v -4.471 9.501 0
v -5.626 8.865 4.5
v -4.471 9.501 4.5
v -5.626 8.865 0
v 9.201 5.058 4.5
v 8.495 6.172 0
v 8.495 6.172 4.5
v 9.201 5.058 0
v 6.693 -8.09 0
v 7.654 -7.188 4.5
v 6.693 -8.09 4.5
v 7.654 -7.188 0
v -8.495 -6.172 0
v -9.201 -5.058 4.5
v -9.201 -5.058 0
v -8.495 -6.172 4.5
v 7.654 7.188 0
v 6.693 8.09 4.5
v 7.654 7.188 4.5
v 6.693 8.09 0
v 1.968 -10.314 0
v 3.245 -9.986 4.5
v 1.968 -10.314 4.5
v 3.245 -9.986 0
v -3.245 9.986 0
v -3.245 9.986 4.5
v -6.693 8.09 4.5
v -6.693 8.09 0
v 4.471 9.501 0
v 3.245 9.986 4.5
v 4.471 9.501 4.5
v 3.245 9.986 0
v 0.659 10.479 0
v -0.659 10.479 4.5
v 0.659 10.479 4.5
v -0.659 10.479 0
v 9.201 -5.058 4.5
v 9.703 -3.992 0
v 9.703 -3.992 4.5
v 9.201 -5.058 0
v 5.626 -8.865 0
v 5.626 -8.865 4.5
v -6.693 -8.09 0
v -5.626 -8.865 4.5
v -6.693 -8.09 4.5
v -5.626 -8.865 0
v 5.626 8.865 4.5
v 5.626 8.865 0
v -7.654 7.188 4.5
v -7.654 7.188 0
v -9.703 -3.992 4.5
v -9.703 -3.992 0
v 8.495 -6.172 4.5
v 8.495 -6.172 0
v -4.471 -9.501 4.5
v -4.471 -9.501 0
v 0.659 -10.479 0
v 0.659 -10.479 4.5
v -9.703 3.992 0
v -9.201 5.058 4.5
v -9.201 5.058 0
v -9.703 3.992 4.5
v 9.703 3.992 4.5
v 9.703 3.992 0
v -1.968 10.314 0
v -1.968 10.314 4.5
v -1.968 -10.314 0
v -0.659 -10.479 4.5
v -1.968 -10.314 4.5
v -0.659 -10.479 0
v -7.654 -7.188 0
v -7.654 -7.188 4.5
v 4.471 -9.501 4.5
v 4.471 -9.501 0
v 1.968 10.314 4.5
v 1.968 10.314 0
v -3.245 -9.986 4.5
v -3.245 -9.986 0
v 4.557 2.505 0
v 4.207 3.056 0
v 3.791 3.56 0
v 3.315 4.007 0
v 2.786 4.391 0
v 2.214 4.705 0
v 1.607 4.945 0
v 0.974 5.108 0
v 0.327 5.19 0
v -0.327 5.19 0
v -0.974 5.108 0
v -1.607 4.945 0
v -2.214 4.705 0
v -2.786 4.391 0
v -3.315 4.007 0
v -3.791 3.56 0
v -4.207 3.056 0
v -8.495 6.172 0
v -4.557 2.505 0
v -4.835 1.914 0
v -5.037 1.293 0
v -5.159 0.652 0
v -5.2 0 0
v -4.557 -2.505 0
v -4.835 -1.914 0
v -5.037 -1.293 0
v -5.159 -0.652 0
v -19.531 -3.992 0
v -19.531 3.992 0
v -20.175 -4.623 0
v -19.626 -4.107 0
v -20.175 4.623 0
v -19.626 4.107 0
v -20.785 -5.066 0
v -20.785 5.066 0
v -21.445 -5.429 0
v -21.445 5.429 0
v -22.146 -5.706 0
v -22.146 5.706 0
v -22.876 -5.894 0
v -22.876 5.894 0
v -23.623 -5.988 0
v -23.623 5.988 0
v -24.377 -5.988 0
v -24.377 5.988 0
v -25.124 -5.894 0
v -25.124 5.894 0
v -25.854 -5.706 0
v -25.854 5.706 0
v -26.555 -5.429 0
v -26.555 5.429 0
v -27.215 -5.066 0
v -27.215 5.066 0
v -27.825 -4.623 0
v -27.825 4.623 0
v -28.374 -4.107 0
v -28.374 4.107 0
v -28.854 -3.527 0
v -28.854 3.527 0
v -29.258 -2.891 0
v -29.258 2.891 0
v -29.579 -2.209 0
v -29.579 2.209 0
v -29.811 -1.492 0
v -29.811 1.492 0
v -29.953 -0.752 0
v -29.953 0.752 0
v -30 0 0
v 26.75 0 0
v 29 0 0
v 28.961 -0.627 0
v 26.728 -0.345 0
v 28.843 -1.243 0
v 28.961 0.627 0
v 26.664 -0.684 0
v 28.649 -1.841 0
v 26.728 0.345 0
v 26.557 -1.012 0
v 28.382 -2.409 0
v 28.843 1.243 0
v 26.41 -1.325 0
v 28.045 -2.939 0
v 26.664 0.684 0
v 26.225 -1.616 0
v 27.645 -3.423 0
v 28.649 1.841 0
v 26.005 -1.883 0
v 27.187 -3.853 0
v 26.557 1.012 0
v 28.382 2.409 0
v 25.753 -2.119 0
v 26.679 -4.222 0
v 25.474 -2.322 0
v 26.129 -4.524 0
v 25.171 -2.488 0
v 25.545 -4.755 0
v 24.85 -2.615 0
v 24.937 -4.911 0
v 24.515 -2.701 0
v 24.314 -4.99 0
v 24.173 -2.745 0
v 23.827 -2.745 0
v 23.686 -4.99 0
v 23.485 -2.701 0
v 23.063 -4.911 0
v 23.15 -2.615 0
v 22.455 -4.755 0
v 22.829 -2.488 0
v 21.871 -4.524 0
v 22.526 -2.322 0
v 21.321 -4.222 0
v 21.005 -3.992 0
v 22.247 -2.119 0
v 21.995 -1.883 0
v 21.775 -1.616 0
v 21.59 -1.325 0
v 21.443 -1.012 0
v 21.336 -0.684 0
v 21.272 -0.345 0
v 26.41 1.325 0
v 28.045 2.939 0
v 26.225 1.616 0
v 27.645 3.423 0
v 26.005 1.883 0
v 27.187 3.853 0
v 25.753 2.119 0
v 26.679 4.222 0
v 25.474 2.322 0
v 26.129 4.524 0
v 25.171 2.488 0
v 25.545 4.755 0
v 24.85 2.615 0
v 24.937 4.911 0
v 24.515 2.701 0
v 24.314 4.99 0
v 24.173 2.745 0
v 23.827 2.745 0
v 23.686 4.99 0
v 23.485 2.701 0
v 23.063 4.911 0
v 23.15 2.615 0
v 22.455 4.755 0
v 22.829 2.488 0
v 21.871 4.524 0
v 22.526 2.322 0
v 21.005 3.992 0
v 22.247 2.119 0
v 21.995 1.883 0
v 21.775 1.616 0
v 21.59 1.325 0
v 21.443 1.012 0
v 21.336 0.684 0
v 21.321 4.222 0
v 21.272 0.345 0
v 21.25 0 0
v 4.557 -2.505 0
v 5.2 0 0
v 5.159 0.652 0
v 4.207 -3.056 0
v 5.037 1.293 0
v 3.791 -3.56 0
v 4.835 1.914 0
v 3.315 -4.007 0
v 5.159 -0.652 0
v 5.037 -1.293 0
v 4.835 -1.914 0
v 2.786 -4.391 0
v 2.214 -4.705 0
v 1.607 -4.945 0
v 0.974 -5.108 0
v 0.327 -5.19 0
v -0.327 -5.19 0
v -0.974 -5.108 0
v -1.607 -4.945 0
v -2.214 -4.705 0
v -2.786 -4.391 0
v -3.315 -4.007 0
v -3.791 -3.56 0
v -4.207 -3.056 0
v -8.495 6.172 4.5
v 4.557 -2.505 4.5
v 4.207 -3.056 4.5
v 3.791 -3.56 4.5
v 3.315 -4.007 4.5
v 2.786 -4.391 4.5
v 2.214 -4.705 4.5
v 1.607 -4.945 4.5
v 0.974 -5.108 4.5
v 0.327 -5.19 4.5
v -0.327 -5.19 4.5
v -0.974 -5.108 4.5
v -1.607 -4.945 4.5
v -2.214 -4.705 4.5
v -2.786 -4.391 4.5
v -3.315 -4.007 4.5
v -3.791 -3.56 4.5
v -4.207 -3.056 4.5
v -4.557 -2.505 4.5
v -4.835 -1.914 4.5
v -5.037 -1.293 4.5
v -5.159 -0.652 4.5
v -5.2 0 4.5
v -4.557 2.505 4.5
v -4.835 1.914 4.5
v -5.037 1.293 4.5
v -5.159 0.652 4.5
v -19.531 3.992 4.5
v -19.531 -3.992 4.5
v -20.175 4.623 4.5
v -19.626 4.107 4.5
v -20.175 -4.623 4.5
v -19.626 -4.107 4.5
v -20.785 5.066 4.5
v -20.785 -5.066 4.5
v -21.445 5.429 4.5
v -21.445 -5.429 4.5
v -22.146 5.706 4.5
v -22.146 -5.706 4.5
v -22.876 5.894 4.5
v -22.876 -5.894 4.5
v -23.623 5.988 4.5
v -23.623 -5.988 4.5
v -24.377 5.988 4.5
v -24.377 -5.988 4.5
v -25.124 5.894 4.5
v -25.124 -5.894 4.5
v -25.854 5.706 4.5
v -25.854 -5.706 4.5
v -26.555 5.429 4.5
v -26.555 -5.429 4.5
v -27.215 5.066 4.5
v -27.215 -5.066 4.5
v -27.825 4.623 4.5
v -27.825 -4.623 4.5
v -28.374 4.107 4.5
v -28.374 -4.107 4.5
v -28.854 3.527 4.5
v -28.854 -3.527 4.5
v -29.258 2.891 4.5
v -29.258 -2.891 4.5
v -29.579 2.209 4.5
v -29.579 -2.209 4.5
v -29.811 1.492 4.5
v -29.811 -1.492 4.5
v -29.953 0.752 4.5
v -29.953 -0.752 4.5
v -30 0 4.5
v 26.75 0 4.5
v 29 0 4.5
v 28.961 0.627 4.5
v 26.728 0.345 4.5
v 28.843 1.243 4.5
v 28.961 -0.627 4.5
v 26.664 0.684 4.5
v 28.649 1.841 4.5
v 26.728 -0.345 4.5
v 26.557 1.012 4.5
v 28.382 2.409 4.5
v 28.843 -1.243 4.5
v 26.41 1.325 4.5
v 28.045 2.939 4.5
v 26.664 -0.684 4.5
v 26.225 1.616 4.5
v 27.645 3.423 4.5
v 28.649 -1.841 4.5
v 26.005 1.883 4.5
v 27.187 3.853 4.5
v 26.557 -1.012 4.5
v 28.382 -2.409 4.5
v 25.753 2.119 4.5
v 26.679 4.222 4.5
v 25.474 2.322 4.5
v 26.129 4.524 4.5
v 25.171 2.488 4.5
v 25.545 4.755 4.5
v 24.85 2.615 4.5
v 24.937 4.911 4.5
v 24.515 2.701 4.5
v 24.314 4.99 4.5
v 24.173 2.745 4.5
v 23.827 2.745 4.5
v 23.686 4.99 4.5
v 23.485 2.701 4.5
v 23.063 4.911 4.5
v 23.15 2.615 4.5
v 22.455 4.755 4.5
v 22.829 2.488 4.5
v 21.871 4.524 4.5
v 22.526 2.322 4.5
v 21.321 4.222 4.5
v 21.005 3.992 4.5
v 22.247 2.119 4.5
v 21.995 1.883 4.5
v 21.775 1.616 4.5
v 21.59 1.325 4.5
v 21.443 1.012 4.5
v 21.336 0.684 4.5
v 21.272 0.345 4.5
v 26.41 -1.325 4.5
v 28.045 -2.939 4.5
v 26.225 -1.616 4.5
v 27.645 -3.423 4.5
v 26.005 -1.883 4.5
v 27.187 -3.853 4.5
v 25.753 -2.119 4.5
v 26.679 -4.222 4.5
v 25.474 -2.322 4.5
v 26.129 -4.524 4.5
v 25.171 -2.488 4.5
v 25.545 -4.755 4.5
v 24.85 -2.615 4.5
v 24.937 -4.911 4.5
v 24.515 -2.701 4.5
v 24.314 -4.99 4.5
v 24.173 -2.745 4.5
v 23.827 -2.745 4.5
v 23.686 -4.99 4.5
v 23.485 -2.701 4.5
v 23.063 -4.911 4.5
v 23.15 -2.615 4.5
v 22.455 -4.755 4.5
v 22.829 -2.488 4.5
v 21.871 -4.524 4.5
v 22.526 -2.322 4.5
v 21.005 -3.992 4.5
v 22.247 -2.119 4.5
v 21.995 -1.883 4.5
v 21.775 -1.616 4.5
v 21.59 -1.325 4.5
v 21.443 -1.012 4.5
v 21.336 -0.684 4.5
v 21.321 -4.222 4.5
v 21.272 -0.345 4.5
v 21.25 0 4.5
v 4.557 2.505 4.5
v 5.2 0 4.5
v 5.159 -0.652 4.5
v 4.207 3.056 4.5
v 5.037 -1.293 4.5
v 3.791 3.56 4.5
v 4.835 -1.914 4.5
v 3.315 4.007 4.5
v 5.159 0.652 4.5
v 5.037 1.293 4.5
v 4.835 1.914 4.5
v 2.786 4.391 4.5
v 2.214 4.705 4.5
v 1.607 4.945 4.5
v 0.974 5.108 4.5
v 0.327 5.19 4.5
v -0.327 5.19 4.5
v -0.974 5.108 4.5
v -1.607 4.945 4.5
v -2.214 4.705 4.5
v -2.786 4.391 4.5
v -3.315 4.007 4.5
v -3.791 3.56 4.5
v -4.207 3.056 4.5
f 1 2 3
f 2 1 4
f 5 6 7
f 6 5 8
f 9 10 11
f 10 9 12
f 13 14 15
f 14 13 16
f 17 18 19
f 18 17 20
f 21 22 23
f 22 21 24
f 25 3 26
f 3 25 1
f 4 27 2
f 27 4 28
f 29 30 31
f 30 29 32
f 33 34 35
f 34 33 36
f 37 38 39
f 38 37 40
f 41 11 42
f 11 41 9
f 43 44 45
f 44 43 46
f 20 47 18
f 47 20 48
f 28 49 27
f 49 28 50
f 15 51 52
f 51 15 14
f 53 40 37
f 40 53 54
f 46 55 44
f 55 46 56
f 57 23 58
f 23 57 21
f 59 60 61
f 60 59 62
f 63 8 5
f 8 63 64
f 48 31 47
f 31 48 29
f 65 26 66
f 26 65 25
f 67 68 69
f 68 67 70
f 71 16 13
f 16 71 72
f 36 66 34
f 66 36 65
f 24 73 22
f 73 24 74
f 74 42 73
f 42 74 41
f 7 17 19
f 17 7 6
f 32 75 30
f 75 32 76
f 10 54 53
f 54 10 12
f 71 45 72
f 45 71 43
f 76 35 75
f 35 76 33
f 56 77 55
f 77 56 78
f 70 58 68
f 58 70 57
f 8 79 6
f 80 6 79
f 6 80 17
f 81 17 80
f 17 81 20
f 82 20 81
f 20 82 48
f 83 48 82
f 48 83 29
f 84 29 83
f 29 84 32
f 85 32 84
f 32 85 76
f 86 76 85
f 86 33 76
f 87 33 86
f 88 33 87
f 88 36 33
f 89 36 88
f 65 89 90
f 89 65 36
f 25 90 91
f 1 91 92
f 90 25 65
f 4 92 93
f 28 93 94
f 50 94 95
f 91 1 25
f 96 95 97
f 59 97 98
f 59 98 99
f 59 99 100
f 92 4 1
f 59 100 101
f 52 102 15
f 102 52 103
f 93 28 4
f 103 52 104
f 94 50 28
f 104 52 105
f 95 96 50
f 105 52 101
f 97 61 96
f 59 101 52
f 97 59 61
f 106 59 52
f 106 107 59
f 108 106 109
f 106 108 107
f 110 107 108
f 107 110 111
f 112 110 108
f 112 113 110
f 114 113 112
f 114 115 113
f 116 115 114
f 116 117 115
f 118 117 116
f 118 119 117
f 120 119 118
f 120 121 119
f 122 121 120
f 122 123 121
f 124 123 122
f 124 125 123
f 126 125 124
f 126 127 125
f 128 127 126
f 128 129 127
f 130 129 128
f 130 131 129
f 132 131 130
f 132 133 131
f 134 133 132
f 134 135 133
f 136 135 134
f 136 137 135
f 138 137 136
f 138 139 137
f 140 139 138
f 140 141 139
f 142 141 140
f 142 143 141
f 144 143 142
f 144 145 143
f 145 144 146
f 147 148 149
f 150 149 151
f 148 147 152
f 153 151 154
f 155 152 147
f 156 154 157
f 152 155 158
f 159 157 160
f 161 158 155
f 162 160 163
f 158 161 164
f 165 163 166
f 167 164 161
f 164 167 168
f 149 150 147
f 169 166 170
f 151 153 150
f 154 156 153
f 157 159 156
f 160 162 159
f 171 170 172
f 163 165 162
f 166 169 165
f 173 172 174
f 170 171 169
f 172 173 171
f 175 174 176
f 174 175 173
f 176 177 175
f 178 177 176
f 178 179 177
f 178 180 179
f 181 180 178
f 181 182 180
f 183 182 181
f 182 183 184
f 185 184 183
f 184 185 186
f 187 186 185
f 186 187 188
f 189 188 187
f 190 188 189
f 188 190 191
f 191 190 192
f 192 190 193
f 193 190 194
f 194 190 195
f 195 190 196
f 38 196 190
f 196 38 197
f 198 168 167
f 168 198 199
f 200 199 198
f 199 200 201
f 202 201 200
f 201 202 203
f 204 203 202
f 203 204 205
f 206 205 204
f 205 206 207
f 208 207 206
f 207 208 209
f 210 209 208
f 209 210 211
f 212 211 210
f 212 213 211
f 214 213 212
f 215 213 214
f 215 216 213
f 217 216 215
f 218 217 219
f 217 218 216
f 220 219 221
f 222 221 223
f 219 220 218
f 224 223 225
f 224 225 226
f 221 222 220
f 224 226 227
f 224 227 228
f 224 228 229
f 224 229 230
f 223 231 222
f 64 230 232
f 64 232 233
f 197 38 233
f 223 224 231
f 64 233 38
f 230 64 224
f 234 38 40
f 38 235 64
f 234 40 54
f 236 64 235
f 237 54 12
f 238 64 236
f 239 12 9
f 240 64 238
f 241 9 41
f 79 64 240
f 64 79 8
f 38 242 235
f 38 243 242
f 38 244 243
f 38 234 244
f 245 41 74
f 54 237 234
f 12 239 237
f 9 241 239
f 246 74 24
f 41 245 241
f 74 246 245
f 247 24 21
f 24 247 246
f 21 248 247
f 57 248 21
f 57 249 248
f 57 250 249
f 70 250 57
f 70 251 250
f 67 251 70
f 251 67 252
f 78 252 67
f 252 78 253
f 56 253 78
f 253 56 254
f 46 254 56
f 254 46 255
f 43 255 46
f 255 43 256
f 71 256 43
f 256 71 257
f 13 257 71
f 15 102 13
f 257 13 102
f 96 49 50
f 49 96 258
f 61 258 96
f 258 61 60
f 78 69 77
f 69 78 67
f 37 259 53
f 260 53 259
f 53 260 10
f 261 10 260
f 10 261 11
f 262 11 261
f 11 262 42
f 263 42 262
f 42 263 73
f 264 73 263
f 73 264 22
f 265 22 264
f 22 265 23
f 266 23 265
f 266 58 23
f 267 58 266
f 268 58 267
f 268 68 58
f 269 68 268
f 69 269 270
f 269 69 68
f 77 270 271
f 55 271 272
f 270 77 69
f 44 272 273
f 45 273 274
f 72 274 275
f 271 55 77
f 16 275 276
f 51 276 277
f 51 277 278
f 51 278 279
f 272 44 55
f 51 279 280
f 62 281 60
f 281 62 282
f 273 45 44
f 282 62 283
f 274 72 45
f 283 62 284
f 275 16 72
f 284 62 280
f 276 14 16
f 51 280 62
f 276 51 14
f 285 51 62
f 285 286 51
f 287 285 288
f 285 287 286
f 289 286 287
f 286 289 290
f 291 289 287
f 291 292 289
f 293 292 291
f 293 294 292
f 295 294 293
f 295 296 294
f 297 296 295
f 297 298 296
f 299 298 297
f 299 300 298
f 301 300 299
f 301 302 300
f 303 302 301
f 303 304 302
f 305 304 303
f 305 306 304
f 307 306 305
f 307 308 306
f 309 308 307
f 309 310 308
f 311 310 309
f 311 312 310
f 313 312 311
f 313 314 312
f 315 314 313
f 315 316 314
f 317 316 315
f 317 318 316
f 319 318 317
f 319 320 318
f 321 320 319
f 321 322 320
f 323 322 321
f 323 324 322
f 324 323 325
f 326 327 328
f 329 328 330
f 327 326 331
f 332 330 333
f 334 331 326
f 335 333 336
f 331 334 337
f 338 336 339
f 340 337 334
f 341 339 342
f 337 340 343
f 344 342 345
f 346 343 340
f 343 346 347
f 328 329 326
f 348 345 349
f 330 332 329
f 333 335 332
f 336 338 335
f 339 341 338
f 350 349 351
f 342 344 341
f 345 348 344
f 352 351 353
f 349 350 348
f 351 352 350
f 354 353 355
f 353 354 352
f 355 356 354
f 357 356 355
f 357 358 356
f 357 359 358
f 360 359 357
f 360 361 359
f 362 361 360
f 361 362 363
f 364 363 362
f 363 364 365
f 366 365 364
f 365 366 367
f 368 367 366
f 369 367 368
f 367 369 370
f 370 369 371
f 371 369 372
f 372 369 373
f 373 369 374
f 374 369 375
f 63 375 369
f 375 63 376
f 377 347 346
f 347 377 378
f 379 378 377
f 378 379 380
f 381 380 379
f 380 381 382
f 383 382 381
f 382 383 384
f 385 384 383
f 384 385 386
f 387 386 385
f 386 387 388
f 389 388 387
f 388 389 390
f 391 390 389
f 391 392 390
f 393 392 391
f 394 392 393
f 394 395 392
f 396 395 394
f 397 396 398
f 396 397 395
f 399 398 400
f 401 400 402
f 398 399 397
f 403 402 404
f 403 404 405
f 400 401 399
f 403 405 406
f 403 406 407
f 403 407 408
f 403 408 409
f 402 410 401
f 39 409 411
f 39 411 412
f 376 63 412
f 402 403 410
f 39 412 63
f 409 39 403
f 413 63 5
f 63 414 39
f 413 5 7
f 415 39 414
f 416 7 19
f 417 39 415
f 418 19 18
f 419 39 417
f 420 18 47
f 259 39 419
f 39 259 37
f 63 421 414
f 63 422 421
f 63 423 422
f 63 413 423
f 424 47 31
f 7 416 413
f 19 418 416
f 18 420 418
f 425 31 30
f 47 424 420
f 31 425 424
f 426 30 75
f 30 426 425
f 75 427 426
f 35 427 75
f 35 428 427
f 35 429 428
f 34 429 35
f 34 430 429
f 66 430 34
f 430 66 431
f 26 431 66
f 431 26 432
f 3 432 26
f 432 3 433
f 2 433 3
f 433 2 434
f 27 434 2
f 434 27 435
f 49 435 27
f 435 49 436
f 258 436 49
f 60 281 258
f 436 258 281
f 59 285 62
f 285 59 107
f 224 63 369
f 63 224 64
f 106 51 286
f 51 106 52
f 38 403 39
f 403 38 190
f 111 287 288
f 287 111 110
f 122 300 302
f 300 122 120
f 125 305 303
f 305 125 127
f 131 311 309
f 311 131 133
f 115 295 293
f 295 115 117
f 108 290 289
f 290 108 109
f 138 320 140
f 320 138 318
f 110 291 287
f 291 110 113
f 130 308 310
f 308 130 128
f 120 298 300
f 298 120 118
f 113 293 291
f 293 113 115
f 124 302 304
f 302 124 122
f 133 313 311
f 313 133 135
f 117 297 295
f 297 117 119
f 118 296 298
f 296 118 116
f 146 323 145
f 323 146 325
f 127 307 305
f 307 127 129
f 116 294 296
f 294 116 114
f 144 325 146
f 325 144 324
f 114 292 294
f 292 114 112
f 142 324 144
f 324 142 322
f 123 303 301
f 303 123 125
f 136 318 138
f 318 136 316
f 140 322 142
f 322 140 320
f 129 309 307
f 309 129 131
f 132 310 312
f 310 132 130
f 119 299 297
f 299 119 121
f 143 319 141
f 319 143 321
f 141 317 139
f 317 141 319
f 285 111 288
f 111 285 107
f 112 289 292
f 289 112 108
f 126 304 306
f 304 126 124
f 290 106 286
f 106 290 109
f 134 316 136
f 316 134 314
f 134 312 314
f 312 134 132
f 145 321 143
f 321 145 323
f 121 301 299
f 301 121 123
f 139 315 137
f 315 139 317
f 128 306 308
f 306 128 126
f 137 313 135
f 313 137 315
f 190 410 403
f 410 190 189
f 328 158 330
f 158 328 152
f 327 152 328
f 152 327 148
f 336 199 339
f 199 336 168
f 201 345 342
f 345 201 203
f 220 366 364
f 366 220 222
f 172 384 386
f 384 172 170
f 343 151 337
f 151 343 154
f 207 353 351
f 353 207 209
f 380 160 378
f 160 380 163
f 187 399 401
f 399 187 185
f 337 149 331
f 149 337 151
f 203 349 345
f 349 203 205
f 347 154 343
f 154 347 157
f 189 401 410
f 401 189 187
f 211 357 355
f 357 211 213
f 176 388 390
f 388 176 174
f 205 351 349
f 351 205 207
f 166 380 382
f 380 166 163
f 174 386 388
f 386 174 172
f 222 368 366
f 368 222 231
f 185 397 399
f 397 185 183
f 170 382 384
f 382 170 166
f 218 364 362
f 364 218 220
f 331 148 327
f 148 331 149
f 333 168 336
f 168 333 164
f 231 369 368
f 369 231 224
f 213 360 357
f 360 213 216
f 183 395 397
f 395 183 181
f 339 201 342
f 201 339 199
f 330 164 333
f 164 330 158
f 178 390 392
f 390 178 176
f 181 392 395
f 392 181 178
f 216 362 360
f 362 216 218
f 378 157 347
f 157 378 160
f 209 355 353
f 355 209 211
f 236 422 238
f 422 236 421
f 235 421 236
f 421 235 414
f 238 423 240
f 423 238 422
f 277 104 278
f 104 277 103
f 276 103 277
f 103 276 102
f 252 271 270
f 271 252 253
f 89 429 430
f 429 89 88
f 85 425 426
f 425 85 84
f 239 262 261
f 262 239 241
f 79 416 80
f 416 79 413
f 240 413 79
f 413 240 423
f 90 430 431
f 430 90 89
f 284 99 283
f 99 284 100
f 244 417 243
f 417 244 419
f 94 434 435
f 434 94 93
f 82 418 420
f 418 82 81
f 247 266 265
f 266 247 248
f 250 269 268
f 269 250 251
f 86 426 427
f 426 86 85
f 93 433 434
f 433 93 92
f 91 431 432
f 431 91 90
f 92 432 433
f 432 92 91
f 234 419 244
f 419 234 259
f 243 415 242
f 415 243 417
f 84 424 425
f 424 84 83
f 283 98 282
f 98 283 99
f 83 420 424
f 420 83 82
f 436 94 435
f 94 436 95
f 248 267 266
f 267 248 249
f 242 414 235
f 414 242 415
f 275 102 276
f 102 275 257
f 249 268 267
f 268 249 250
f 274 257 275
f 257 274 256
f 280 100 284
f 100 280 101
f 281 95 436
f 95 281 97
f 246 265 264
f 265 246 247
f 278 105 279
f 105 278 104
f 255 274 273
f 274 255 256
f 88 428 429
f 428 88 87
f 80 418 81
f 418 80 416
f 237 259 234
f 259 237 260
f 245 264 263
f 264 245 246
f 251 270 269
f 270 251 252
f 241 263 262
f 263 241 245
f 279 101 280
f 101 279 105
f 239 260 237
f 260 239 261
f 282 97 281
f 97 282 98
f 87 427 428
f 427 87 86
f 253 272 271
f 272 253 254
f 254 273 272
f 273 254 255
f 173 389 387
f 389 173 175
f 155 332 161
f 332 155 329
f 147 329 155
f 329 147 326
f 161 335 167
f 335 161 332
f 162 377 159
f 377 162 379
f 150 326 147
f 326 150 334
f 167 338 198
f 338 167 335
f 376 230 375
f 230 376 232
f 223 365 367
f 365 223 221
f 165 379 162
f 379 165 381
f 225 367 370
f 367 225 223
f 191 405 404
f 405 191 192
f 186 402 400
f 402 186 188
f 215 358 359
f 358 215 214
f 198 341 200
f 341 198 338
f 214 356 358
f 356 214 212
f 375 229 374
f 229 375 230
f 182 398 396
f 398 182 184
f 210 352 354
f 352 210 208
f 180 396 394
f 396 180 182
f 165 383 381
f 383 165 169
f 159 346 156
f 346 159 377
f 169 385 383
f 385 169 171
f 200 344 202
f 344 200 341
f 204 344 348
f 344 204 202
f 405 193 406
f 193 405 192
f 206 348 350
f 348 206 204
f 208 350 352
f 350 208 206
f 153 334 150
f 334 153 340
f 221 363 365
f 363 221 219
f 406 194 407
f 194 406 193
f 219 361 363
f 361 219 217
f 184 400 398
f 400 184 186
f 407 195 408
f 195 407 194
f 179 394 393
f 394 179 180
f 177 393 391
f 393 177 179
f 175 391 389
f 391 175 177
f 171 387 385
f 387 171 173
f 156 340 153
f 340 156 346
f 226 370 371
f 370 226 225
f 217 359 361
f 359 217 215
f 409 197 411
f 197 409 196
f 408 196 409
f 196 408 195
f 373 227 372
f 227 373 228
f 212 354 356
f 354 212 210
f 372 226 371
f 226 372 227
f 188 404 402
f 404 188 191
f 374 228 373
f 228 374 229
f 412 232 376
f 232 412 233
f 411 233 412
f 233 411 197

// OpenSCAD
difference() {
  difference() {
    union() {
      union() {
        union() {
          cylinder(h = 4.5, r = 10.5);
          hull() {
            translate([-24, 0, 0]) {
              cylinder(h = 4.5, r = 4);
            }
            translate([24, 0, 0]) {
              cylinder(h = 4.5, r = 4);
            }
          }
        }
        translate([-24, 0, 0]) {
          cylinder(h = 4.5, r = 6);
        }
      }
      translate([24, 0, 0]) {
        cylinder(h = 4.5, r = 5);
      }
    }
    translate([0, 0, -0.2]) {
      cylinder(h = 4.9, r = 5.2);
    }
  }
  translate([24, 0, 0]) {
    translate([0, 0, -0.2]) {
      cylinder(h = 4.9, r = 2.75);
    }
  }
}
$fn = 50;
